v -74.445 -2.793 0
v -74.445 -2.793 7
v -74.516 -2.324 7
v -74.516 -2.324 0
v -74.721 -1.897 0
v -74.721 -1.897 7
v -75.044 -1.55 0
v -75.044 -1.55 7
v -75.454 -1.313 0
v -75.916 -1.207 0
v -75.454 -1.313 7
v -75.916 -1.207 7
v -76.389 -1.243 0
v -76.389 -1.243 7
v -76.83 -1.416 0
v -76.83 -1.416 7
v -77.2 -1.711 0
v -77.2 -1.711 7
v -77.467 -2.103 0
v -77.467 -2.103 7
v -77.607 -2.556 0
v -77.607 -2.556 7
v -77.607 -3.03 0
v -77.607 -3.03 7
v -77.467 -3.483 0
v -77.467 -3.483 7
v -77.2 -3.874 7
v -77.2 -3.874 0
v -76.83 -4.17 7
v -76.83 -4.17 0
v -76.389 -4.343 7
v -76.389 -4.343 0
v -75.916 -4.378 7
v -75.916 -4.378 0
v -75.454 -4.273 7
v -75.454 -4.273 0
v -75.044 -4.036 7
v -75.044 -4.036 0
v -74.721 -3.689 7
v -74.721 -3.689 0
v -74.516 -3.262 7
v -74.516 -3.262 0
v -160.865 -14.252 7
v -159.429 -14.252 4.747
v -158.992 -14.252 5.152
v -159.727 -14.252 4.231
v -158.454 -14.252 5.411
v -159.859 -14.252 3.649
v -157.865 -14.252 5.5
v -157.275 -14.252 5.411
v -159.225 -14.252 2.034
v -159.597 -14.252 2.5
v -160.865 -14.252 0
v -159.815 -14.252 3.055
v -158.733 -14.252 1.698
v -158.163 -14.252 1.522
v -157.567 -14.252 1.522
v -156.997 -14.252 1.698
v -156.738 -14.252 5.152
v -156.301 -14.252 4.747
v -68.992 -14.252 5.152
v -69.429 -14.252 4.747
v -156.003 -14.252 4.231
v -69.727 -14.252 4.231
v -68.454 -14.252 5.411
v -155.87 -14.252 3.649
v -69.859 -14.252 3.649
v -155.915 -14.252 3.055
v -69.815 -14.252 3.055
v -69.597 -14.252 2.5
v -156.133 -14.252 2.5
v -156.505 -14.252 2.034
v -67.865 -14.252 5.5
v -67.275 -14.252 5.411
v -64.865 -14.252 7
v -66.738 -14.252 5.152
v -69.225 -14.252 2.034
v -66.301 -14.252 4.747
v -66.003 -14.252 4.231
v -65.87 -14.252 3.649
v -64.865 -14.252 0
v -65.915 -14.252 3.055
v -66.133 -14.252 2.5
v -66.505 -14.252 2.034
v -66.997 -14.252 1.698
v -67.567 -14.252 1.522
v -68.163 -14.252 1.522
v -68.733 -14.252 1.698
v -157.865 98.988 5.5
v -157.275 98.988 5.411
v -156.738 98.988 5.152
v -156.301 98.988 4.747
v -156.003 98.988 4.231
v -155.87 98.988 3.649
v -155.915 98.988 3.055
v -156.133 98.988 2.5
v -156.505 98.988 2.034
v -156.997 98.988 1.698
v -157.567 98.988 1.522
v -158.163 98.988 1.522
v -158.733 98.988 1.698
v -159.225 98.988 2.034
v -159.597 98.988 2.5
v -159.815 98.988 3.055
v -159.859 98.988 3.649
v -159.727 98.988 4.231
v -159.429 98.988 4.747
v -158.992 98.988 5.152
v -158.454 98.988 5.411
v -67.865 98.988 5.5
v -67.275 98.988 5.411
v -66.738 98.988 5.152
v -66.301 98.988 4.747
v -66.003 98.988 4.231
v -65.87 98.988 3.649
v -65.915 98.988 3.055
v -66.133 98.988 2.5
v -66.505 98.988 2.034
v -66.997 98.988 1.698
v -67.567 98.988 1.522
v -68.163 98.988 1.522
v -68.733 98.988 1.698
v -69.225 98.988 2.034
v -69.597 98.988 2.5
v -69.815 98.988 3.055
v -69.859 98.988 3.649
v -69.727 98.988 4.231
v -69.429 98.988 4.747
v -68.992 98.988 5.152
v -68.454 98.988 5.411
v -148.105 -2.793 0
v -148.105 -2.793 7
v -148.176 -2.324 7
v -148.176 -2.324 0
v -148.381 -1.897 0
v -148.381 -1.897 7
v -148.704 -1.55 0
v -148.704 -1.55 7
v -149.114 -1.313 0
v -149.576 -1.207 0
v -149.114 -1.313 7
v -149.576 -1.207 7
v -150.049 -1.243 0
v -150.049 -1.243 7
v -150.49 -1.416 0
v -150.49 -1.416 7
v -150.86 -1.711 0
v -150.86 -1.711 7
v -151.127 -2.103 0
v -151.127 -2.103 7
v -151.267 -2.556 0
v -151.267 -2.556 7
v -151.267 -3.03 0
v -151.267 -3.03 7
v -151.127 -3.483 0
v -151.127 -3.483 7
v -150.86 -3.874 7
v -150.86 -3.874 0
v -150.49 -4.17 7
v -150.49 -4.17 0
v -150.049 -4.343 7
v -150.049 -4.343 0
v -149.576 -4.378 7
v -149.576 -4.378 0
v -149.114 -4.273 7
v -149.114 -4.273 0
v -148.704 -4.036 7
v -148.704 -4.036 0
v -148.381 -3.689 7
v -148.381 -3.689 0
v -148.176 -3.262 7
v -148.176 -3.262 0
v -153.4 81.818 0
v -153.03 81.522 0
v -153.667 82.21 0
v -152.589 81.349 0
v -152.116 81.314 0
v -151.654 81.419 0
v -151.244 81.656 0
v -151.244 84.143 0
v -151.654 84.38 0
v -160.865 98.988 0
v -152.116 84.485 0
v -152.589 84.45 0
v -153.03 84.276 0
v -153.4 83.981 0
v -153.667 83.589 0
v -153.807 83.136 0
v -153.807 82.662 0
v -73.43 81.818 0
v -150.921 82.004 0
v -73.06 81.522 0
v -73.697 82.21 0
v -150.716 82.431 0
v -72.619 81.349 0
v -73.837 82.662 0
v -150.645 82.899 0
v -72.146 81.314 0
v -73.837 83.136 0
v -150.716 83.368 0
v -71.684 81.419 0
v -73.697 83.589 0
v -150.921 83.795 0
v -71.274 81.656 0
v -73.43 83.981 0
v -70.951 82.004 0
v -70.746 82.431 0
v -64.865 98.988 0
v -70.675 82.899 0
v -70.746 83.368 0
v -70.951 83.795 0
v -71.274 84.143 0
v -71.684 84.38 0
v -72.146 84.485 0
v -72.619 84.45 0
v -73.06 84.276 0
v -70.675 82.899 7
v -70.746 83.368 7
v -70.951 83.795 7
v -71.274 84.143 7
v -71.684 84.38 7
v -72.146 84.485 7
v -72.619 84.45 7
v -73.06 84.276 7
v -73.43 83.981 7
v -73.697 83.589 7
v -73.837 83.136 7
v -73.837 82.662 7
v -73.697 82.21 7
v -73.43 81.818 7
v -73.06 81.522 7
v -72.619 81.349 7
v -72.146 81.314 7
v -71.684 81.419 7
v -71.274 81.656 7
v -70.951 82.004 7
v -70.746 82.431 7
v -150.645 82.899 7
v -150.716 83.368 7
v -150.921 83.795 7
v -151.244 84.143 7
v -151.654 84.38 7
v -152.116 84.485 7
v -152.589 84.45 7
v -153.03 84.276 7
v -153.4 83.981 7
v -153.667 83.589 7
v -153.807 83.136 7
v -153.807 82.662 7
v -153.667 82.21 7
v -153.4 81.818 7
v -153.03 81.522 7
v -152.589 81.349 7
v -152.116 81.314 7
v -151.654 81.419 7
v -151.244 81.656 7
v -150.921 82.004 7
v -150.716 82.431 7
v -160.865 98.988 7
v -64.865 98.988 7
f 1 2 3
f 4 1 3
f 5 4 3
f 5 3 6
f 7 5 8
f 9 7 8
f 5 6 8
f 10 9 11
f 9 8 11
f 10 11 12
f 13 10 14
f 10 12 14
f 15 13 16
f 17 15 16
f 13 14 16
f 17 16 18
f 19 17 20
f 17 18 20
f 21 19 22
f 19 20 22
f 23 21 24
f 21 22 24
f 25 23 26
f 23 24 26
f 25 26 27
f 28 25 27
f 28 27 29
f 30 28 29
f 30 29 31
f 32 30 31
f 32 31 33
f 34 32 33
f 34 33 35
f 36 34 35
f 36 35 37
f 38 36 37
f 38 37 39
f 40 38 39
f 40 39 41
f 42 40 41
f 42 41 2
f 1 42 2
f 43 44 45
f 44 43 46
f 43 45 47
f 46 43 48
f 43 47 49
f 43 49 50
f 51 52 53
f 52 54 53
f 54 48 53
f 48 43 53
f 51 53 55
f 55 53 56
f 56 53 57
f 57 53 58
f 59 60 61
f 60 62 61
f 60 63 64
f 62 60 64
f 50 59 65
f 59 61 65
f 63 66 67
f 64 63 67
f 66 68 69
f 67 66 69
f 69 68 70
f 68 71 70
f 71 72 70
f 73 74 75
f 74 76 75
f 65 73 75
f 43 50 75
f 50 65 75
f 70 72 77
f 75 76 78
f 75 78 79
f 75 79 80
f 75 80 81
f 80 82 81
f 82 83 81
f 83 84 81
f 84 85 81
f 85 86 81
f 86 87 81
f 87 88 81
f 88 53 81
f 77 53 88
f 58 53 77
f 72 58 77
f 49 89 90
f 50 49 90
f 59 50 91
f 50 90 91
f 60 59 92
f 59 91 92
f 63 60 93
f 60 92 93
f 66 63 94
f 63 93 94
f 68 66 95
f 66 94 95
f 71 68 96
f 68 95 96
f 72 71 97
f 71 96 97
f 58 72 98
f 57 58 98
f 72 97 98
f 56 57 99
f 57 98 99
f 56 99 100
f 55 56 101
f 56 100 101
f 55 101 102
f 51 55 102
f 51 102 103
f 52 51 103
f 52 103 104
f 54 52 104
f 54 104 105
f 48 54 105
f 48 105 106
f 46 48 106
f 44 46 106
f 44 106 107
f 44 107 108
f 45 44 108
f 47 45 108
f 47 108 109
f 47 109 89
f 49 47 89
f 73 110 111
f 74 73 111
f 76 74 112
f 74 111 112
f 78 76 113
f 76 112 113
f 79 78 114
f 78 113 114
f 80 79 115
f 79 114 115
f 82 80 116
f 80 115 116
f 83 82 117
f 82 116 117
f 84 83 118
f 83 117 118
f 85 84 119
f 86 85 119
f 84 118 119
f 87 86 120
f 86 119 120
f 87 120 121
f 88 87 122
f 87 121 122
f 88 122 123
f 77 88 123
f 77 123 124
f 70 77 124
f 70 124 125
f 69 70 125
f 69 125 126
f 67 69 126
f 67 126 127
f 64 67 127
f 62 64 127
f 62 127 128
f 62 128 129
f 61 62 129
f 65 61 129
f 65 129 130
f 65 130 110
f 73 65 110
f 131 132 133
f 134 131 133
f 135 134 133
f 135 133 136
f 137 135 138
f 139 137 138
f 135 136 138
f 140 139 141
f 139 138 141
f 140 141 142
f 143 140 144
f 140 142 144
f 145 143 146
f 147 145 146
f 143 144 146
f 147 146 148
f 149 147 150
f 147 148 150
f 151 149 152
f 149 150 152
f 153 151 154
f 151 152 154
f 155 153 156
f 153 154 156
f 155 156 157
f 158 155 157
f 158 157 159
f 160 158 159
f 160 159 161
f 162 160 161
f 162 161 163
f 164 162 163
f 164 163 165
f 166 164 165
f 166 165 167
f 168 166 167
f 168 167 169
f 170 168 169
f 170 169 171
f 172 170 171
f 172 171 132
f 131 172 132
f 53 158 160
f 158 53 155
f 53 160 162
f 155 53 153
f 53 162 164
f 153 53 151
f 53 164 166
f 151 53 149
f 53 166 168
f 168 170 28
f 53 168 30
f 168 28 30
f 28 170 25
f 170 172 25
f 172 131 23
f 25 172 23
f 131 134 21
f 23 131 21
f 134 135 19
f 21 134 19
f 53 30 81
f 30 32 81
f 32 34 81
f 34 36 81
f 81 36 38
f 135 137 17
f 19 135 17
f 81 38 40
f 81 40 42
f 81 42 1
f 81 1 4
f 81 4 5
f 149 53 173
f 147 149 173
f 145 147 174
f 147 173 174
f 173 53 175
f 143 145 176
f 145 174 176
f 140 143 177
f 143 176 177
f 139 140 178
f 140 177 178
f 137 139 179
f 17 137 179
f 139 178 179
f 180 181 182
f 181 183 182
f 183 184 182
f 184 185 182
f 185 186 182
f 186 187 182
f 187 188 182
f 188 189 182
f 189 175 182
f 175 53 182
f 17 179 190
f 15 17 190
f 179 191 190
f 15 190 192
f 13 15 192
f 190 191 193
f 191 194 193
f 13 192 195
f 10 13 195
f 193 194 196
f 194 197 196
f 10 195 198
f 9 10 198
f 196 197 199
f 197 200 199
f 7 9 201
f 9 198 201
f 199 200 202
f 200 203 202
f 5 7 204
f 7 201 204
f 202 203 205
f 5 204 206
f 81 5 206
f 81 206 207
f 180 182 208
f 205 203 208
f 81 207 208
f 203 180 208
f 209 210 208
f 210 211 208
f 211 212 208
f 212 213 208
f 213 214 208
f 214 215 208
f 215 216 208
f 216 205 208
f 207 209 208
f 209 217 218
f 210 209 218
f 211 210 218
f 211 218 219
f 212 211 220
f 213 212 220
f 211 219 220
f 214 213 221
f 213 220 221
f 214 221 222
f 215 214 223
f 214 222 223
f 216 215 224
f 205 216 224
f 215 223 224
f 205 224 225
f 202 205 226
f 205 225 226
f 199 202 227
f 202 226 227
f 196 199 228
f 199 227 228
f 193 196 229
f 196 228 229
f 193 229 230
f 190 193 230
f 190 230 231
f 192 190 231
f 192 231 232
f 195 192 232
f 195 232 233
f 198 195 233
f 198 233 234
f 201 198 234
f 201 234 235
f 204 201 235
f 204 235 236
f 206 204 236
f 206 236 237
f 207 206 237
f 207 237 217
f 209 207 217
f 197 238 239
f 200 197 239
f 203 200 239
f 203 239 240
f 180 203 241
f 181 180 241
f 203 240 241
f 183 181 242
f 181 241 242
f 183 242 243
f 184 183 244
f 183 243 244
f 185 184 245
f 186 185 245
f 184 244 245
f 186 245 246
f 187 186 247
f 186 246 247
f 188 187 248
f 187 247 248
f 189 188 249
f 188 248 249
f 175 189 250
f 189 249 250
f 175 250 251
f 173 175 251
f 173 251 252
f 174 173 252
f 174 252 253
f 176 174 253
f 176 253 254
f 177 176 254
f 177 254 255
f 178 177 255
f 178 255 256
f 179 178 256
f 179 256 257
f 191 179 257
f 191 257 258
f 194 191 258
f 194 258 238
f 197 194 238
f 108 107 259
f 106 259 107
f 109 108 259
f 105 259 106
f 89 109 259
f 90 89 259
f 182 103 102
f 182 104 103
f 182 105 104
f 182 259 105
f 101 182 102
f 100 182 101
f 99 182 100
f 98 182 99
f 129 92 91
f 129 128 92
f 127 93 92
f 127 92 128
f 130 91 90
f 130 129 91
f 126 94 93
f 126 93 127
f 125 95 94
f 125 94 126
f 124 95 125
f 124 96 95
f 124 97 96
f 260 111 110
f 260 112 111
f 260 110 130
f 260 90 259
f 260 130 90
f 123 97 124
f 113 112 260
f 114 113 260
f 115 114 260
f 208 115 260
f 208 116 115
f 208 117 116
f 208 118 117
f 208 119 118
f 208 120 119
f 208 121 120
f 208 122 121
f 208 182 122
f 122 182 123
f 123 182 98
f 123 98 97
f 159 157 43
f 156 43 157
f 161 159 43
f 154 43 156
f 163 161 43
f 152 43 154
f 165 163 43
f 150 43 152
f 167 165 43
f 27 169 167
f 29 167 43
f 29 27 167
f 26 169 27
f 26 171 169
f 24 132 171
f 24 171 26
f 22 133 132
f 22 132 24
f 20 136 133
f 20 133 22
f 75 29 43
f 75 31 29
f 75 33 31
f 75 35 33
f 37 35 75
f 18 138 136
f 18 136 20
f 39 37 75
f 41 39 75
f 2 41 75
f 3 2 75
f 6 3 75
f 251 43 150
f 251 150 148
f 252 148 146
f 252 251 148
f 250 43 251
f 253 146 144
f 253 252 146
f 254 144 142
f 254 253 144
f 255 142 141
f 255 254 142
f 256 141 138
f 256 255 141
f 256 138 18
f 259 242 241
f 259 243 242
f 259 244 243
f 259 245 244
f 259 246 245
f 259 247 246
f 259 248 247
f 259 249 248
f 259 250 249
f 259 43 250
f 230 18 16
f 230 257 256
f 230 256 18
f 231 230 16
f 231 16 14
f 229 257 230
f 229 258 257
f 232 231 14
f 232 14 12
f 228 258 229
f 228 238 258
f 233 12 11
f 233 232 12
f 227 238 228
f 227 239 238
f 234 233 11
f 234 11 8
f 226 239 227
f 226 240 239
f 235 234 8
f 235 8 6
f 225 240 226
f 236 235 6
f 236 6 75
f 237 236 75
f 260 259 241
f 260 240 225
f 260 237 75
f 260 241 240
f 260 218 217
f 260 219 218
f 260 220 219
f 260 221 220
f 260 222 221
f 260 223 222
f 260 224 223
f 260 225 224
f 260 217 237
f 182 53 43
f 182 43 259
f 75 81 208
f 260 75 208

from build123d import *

# Parameters (mm, degrees)
SKETCH1_W           = 96
SKETCH1_H           = 113.24
BOSS_EXTRUDE1_DEPTH = 7
SKETCH2_R           = 1.59
CUT_EXTRUDE1_DEPTH  = 10
SKETCH4_R           = 2
CUT_EXTRUDE3_DEPTH  = 197.849722269


with BuildPart() as part:
    # Sketch1 → Boss-Extrude1 (new body)
    with BuildSketch(Plane.XY):
        with Locations((-112.864898463, 42.367863248)):
            Rectangle(SKETCH1_W, SKETCH1_H)
    extrude(amount=BOSS_EXTRUDE1_DEPTH)

    # Sketch2 → Cut-Extrude1 (cut)
    with BuildSketch(Plane.XY.offset(7)):
        with Locations((-152.234898463, 82.899456576)):
            Circle(SKETCH2_R)
        with Locations((-72.264898463, 82.899456576)):
            Circle(SKETCH2_R)
        with Locations((-149.694898463, -2.792907728)):
            Circle(SKETCH2_R)
        with Locations((-76.034898463, -2.792907728)):
            Circle(SKETCH2_R)
    extrude(amount=-CUT_EXTRUDE1_DEPTH, mode=Mode.SUBTRACT)

    # Sketch4 → Cut-Extrude3 (cut, through all)
    with BuildSketch(Plane(origin=(0, 98.987863248, 0), x_dir=(1, 0, 0), z_dir=(0, 1, 0))):
        with Locations(Location((-67.864898463, -3.5, 0), (0, 0, 270))):
            Circle(SKETCH4_R)
        with Locations(Location((-157.864898463, -3.5, 0), (0, 0, 270))):
            Circle(SKETCH4_R)
    extrude(amount=-CUT_EXTRUDE3_DEPTH, mode=Mode.SUBTRACT)


solid = part.part
